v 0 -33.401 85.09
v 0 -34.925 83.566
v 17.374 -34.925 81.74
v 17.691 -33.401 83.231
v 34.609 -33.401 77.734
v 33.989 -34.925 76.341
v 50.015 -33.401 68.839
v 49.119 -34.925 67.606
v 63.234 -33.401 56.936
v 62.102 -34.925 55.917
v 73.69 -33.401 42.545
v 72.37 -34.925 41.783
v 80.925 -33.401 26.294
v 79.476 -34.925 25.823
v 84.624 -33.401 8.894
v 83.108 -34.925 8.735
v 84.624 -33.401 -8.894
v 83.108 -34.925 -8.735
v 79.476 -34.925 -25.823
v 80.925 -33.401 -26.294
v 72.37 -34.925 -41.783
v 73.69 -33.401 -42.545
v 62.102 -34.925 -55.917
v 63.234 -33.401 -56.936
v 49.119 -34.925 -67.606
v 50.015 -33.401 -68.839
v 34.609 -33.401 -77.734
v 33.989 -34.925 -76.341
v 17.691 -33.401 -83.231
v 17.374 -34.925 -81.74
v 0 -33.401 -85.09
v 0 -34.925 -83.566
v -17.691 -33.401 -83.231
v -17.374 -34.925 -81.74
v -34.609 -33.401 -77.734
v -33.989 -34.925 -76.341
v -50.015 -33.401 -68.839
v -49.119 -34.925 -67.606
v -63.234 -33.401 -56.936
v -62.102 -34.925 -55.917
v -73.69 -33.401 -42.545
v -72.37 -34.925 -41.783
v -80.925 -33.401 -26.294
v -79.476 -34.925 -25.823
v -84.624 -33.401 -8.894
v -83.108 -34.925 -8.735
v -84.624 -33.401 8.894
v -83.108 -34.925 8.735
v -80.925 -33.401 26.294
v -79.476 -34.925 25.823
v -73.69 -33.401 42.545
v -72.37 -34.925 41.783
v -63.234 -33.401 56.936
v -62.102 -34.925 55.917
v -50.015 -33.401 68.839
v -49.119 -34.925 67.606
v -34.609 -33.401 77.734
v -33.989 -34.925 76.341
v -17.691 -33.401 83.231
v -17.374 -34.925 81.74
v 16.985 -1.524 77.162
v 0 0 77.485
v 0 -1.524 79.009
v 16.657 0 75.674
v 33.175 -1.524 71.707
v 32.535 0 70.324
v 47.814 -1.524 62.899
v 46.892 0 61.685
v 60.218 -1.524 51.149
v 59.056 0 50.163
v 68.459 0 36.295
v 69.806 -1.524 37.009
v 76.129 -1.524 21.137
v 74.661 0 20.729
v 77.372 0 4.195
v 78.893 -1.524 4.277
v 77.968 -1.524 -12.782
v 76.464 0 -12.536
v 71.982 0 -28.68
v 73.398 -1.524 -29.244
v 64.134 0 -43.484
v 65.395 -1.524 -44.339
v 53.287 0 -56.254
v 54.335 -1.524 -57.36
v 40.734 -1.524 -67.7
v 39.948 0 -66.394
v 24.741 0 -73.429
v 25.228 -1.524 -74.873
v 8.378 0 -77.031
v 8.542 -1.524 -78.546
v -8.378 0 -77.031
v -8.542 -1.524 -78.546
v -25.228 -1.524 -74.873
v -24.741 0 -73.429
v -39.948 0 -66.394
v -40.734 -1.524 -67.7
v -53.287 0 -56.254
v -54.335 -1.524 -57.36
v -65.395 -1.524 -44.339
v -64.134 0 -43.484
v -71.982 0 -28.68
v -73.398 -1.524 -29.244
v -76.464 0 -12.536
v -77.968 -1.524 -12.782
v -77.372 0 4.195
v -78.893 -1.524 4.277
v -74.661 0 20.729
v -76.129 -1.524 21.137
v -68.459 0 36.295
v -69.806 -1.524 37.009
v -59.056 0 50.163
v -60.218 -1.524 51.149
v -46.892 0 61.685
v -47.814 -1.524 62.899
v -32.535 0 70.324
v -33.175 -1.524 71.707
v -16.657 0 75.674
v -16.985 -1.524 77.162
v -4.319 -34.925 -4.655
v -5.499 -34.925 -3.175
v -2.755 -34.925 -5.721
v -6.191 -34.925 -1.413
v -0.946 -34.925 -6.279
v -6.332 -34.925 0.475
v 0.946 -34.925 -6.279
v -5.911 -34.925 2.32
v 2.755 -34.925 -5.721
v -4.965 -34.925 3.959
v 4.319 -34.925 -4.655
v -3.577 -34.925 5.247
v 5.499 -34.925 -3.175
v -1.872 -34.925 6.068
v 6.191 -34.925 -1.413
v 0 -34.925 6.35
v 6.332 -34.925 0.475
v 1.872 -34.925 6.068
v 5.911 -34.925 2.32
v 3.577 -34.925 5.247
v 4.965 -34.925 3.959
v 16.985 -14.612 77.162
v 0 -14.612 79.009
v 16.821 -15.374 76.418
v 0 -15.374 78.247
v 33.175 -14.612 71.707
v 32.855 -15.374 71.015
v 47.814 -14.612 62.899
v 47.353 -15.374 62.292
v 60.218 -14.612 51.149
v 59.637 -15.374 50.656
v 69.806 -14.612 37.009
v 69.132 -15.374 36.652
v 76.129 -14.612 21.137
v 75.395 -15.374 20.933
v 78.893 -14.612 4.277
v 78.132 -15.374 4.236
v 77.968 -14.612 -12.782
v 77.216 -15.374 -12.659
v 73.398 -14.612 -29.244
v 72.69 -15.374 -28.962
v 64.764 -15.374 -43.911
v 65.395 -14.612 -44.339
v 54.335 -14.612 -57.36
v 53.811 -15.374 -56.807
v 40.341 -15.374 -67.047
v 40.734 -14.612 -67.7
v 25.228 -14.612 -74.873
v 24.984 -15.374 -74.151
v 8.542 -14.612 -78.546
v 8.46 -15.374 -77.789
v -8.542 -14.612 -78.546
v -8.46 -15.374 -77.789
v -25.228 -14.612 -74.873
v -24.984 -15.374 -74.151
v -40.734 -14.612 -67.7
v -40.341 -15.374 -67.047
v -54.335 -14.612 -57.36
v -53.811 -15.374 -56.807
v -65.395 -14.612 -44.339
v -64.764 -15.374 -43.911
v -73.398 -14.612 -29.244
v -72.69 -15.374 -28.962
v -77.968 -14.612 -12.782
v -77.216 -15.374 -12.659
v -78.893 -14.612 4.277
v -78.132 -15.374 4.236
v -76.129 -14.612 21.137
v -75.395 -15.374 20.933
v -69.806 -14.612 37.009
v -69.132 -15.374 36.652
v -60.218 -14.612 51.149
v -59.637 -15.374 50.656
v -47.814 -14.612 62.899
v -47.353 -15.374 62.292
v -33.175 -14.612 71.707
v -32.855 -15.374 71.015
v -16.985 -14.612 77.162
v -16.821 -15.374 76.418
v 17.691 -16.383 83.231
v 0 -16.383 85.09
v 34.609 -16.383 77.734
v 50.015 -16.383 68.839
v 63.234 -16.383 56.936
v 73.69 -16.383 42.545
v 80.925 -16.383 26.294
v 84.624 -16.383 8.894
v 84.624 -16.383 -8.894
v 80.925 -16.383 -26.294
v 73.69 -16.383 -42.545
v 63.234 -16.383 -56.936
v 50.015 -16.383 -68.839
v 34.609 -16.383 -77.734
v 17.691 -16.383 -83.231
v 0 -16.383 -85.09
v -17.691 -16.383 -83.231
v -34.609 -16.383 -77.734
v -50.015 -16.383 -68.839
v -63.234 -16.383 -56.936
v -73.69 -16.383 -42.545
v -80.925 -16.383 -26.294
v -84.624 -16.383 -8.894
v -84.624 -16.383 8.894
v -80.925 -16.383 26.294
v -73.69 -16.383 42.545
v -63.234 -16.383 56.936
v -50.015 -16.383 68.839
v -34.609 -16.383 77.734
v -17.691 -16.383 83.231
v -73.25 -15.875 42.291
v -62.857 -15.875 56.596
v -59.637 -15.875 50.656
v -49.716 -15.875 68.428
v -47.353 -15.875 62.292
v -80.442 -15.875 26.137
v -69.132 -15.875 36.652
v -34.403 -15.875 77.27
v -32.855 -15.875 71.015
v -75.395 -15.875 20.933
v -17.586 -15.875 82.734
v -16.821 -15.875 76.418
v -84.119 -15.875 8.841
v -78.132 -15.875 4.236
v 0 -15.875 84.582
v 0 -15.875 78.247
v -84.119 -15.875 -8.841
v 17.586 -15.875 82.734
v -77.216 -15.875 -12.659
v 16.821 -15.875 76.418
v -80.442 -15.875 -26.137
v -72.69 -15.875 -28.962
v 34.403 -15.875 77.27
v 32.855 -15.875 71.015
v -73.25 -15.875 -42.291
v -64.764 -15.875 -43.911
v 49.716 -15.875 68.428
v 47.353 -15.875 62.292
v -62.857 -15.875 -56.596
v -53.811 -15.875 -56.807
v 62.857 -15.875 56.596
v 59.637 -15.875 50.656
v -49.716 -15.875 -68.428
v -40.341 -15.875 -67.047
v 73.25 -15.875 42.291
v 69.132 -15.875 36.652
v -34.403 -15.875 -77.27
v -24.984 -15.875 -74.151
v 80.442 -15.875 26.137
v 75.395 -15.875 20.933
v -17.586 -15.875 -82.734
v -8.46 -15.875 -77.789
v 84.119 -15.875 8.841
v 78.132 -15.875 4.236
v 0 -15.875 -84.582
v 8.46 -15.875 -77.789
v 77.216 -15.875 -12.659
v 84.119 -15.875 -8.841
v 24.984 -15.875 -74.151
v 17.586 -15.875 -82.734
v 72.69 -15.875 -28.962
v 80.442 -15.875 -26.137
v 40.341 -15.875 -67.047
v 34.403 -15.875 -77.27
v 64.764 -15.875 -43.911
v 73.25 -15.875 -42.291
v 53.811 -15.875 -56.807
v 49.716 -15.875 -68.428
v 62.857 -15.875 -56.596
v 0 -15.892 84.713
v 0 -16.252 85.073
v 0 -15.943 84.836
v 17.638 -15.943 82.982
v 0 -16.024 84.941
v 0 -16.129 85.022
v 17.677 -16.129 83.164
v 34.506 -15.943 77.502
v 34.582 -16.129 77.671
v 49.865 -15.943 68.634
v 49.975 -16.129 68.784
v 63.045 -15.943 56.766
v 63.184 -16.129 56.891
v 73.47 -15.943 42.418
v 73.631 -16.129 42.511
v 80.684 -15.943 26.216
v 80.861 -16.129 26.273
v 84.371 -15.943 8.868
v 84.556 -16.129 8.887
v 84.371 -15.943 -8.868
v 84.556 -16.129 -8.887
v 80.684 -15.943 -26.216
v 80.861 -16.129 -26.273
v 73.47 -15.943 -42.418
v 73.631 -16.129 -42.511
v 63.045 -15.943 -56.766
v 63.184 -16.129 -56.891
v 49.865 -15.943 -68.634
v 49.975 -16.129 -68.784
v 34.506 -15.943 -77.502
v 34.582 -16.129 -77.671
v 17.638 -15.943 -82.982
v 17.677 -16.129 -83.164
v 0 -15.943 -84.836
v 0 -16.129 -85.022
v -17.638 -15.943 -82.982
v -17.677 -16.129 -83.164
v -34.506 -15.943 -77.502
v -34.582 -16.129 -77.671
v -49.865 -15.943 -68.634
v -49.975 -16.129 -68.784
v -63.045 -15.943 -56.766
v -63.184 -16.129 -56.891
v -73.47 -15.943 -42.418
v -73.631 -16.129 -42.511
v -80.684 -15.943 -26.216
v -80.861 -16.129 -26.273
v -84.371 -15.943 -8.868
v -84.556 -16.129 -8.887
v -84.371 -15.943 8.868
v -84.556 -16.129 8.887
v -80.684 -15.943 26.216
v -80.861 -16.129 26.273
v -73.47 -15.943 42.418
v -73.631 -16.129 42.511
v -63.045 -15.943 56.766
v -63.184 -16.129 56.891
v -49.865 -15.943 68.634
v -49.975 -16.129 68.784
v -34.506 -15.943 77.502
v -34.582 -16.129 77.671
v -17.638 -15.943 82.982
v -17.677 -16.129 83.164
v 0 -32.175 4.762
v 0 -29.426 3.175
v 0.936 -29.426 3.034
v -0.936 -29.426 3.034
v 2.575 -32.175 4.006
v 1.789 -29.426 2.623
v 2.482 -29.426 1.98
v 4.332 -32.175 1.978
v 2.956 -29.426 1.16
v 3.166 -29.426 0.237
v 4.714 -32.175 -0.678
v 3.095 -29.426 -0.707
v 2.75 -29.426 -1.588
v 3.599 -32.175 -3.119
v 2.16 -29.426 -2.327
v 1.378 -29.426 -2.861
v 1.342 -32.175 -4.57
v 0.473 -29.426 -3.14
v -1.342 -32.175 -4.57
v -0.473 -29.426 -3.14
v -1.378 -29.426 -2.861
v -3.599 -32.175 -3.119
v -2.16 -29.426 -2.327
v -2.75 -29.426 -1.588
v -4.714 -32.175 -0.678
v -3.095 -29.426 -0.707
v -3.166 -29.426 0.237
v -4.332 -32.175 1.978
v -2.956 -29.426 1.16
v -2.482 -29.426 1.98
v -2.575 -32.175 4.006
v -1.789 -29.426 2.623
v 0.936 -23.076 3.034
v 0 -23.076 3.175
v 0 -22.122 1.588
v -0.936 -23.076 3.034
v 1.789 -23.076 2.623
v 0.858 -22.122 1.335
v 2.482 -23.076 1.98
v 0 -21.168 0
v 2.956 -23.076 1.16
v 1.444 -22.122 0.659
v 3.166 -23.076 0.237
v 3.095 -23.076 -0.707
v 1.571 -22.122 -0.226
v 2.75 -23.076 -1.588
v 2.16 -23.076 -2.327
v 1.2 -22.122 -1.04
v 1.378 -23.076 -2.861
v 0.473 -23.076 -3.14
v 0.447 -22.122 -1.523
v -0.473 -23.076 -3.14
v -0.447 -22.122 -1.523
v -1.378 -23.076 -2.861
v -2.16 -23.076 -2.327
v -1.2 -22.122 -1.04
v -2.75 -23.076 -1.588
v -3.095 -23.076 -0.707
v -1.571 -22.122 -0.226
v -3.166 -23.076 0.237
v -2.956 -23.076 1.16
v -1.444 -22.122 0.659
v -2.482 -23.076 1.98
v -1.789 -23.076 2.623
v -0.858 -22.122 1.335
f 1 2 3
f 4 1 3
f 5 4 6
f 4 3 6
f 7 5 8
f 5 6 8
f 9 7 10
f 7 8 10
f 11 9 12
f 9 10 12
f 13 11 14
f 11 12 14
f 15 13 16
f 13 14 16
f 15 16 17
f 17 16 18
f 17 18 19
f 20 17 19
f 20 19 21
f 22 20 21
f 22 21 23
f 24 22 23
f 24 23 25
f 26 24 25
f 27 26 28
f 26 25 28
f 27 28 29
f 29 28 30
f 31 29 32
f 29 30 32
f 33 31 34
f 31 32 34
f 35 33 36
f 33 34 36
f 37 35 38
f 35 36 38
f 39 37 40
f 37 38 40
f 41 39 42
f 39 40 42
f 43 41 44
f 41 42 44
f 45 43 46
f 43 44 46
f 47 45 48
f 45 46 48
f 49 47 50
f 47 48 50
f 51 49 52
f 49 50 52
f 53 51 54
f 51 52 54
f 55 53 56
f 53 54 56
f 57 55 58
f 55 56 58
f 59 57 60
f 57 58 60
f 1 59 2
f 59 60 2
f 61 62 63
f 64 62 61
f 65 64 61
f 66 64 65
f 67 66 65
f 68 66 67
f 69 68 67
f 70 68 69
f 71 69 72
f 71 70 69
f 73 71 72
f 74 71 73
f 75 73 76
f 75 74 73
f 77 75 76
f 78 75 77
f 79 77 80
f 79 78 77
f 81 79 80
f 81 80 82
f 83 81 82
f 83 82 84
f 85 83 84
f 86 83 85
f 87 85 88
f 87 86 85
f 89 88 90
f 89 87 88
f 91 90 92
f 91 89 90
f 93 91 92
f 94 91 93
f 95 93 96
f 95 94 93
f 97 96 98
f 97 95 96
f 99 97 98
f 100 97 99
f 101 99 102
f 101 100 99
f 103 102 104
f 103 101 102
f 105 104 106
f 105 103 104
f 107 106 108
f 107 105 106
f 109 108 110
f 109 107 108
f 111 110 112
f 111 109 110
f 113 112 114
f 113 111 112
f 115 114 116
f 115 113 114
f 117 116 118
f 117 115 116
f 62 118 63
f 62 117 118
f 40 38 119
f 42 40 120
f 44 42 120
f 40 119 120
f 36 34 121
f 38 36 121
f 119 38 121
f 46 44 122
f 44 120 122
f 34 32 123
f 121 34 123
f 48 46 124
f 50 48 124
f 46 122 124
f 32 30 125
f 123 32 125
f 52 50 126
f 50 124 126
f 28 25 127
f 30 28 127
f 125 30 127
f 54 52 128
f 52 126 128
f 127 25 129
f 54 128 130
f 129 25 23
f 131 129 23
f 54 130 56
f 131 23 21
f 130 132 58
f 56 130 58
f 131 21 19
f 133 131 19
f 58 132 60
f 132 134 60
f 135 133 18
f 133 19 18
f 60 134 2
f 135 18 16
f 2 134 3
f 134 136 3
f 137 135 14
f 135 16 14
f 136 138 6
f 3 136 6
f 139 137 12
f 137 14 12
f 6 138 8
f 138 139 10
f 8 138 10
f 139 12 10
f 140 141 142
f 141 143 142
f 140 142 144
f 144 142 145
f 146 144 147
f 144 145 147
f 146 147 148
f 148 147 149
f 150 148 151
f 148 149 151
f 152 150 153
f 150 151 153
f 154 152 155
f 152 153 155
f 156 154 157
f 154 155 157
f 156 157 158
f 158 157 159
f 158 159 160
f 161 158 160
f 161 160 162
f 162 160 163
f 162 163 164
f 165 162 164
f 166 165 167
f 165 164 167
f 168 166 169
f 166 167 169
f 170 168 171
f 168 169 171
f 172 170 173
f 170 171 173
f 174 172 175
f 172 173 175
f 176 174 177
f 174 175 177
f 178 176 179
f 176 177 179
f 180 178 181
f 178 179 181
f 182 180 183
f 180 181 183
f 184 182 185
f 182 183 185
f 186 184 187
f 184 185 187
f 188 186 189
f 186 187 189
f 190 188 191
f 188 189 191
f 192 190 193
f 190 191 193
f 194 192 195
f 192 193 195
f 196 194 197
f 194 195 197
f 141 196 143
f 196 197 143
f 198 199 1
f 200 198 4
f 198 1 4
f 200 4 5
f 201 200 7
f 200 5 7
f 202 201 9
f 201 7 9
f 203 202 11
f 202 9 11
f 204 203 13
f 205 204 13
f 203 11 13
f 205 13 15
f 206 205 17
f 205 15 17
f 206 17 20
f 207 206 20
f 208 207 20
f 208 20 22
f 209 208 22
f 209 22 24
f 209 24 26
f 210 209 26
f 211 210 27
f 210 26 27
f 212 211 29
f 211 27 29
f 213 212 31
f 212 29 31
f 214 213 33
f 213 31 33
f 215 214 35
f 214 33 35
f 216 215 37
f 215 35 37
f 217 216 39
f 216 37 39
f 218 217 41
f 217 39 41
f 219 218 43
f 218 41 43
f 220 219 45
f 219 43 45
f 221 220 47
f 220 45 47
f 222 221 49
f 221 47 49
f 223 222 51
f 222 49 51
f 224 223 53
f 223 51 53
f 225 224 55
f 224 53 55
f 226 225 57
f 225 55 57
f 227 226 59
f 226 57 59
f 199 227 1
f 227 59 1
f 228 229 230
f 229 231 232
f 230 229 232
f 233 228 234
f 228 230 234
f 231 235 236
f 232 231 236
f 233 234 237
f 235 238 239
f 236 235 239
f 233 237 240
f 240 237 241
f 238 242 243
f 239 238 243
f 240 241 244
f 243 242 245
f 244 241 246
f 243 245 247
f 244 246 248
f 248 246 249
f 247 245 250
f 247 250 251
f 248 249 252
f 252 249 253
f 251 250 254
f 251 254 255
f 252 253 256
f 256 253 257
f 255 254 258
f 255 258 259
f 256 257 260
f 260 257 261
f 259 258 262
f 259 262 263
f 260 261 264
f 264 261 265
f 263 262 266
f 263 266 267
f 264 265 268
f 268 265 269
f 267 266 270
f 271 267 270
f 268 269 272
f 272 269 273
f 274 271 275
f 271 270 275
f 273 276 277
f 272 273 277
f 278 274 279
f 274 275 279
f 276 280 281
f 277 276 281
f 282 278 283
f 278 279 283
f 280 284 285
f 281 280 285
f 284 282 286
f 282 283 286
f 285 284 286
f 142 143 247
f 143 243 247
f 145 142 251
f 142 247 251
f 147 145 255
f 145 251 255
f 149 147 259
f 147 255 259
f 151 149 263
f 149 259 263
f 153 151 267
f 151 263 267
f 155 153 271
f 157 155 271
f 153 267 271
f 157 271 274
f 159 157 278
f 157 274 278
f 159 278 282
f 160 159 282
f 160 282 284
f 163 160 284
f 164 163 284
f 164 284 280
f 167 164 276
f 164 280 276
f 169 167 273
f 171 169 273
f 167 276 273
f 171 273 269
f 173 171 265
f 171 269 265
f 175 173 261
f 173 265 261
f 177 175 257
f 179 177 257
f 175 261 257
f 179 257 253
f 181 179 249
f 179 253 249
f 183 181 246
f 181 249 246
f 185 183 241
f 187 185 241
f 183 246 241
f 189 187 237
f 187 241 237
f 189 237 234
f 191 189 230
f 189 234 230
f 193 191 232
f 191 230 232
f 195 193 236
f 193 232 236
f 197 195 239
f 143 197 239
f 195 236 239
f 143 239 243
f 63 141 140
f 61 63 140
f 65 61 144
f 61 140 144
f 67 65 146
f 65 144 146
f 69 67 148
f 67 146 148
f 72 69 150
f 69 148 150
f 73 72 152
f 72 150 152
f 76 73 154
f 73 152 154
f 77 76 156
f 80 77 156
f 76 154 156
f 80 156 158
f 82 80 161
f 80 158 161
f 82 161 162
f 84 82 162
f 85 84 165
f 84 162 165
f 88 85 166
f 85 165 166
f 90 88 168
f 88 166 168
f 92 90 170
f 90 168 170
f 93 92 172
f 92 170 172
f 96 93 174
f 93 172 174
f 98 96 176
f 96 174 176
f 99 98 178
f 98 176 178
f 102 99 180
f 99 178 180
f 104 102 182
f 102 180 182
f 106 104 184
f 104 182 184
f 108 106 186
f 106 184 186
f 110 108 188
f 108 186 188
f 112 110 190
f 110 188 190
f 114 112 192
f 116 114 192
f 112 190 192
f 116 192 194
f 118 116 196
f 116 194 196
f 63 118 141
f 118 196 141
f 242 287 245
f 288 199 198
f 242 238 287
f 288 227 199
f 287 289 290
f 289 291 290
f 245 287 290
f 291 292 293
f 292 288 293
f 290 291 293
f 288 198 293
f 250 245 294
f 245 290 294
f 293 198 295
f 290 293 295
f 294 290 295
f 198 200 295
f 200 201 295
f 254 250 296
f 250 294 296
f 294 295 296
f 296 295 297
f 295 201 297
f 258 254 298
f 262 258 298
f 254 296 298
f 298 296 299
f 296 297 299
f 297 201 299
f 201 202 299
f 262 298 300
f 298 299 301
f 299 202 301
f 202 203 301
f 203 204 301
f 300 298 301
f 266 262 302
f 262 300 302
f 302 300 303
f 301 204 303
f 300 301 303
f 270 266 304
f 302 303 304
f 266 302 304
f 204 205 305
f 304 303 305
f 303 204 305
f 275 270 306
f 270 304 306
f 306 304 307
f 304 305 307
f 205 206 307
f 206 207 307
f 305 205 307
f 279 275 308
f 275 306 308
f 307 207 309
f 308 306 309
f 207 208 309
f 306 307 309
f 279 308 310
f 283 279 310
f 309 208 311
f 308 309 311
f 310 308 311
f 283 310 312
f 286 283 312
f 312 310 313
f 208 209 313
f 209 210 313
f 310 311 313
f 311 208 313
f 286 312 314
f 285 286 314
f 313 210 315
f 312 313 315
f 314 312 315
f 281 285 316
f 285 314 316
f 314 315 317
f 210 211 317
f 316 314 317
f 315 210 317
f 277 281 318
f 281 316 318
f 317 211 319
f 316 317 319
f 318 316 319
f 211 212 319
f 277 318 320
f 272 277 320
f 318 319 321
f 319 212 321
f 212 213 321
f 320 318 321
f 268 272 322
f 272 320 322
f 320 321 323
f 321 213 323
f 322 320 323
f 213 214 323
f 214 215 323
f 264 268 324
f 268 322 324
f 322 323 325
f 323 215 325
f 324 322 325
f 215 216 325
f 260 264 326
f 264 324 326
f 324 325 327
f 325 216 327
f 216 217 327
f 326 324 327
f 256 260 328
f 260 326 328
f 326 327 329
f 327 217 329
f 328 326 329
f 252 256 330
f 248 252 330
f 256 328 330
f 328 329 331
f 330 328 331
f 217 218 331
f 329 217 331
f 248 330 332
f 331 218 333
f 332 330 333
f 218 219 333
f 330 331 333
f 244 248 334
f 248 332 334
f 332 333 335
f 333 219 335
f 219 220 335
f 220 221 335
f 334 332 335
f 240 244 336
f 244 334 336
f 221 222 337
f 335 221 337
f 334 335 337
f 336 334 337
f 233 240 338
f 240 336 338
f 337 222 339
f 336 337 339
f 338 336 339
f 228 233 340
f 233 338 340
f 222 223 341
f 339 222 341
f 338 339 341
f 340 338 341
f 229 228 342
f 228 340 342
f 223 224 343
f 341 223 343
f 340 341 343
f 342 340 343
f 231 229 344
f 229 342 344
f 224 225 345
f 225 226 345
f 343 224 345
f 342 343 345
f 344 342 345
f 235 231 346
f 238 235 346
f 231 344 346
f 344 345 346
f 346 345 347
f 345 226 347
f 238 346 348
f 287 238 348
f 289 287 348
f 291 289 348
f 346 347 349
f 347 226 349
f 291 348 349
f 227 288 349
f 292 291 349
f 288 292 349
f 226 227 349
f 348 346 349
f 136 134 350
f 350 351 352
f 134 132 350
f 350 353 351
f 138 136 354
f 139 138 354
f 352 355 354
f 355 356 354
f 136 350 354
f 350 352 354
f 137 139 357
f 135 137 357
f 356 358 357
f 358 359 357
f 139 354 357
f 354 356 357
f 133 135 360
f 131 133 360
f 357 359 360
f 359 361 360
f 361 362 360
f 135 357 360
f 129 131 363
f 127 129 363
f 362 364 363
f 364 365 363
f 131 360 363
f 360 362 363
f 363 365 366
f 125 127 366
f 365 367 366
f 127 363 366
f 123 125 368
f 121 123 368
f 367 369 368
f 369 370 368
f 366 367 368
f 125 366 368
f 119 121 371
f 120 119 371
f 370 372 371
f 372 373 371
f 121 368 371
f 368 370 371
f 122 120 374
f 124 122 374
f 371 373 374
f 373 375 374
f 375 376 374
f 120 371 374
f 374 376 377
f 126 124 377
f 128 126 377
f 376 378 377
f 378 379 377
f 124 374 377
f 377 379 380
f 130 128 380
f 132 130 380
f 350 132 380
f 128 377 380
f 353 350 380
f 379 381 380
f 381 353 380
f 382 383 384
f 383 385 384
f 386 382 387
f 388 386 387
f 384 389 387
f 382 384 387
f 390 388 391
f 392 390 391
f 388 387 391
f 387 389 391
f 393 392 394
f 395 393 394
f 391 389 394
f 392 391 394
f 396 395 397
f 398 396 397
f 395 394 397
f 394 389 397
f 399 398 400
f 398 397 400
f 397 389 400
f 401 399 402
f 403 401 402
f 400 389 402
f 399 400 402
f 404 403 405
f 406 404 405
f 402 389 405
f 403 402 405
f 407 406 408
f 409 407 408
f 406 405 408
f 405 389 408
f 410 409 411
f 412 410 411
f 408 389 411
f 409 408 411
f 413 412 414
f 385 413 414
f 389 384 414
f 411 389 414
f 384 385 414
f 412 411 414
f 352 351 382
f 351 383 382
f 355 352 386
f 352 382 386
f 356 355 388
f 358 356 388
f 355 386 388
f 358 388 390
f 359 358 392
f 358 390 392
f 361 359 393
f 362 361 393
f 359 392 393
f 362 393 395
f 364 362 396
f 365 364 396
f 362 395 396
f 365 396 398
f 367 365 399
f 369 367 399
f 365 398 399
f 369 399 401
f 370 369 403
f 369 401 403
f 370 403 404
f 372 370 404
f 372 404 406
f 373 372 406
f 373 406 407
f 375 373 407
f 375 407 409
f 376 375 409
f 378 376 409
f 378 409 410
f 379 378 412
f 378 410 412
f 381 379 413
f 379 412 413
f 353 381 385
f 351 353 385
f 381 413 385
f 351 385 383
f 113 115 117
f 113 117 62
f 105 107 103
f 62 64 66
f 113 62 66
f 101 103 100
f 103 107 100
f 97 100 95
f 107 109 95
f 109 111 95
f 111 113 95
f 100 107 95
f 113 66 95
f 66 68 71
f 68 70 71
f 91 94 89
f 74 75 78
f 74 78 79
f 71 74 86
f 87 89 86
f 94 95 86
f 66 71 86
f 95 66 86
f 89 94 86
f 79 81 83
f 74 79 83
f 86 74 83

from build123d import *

# Parameters (mm, degrees)
F2_R    = 0.508
F3_SIZE = 1.524


with BuildPart() as f1:
    # F0 (on Right) → F1 (revolve)
    with BuildSketch(Plane.YZ):
        Polygon((-21.1680062206, 0), (0, 0), (0, 79.00924), (-14.6116351058, 79.00924), (-15.3736351058, 78.24724), (-15.875, 78.24724), (-15.875, 79.00924), (-15.875, 85.09), (-34.925, 85.09), (-34.925, 6.35), (-29.425738686, 3.175), (-23.075738686, 3.175), align=None)
    revolve(axis=Axis((0, -21.1680062206, 0), (0, 1, 0)))

    # F2
    f2_edges = [f1.edges().sort_by_distance(p)[0] for p in [
        (0, -15.875, -85.09),
    ]]
    fillet(f2_edges, radius=F2_R)

    # F3
    f3_edges = [f1.edges().sort_by_distance(p)[0] for p in [
        (0, 0, -79.00924),
        (0, -34.925, -85.09),
    ]]
    chamfer(f3_edges, length=F3_SIZE)


solid = f1.part
